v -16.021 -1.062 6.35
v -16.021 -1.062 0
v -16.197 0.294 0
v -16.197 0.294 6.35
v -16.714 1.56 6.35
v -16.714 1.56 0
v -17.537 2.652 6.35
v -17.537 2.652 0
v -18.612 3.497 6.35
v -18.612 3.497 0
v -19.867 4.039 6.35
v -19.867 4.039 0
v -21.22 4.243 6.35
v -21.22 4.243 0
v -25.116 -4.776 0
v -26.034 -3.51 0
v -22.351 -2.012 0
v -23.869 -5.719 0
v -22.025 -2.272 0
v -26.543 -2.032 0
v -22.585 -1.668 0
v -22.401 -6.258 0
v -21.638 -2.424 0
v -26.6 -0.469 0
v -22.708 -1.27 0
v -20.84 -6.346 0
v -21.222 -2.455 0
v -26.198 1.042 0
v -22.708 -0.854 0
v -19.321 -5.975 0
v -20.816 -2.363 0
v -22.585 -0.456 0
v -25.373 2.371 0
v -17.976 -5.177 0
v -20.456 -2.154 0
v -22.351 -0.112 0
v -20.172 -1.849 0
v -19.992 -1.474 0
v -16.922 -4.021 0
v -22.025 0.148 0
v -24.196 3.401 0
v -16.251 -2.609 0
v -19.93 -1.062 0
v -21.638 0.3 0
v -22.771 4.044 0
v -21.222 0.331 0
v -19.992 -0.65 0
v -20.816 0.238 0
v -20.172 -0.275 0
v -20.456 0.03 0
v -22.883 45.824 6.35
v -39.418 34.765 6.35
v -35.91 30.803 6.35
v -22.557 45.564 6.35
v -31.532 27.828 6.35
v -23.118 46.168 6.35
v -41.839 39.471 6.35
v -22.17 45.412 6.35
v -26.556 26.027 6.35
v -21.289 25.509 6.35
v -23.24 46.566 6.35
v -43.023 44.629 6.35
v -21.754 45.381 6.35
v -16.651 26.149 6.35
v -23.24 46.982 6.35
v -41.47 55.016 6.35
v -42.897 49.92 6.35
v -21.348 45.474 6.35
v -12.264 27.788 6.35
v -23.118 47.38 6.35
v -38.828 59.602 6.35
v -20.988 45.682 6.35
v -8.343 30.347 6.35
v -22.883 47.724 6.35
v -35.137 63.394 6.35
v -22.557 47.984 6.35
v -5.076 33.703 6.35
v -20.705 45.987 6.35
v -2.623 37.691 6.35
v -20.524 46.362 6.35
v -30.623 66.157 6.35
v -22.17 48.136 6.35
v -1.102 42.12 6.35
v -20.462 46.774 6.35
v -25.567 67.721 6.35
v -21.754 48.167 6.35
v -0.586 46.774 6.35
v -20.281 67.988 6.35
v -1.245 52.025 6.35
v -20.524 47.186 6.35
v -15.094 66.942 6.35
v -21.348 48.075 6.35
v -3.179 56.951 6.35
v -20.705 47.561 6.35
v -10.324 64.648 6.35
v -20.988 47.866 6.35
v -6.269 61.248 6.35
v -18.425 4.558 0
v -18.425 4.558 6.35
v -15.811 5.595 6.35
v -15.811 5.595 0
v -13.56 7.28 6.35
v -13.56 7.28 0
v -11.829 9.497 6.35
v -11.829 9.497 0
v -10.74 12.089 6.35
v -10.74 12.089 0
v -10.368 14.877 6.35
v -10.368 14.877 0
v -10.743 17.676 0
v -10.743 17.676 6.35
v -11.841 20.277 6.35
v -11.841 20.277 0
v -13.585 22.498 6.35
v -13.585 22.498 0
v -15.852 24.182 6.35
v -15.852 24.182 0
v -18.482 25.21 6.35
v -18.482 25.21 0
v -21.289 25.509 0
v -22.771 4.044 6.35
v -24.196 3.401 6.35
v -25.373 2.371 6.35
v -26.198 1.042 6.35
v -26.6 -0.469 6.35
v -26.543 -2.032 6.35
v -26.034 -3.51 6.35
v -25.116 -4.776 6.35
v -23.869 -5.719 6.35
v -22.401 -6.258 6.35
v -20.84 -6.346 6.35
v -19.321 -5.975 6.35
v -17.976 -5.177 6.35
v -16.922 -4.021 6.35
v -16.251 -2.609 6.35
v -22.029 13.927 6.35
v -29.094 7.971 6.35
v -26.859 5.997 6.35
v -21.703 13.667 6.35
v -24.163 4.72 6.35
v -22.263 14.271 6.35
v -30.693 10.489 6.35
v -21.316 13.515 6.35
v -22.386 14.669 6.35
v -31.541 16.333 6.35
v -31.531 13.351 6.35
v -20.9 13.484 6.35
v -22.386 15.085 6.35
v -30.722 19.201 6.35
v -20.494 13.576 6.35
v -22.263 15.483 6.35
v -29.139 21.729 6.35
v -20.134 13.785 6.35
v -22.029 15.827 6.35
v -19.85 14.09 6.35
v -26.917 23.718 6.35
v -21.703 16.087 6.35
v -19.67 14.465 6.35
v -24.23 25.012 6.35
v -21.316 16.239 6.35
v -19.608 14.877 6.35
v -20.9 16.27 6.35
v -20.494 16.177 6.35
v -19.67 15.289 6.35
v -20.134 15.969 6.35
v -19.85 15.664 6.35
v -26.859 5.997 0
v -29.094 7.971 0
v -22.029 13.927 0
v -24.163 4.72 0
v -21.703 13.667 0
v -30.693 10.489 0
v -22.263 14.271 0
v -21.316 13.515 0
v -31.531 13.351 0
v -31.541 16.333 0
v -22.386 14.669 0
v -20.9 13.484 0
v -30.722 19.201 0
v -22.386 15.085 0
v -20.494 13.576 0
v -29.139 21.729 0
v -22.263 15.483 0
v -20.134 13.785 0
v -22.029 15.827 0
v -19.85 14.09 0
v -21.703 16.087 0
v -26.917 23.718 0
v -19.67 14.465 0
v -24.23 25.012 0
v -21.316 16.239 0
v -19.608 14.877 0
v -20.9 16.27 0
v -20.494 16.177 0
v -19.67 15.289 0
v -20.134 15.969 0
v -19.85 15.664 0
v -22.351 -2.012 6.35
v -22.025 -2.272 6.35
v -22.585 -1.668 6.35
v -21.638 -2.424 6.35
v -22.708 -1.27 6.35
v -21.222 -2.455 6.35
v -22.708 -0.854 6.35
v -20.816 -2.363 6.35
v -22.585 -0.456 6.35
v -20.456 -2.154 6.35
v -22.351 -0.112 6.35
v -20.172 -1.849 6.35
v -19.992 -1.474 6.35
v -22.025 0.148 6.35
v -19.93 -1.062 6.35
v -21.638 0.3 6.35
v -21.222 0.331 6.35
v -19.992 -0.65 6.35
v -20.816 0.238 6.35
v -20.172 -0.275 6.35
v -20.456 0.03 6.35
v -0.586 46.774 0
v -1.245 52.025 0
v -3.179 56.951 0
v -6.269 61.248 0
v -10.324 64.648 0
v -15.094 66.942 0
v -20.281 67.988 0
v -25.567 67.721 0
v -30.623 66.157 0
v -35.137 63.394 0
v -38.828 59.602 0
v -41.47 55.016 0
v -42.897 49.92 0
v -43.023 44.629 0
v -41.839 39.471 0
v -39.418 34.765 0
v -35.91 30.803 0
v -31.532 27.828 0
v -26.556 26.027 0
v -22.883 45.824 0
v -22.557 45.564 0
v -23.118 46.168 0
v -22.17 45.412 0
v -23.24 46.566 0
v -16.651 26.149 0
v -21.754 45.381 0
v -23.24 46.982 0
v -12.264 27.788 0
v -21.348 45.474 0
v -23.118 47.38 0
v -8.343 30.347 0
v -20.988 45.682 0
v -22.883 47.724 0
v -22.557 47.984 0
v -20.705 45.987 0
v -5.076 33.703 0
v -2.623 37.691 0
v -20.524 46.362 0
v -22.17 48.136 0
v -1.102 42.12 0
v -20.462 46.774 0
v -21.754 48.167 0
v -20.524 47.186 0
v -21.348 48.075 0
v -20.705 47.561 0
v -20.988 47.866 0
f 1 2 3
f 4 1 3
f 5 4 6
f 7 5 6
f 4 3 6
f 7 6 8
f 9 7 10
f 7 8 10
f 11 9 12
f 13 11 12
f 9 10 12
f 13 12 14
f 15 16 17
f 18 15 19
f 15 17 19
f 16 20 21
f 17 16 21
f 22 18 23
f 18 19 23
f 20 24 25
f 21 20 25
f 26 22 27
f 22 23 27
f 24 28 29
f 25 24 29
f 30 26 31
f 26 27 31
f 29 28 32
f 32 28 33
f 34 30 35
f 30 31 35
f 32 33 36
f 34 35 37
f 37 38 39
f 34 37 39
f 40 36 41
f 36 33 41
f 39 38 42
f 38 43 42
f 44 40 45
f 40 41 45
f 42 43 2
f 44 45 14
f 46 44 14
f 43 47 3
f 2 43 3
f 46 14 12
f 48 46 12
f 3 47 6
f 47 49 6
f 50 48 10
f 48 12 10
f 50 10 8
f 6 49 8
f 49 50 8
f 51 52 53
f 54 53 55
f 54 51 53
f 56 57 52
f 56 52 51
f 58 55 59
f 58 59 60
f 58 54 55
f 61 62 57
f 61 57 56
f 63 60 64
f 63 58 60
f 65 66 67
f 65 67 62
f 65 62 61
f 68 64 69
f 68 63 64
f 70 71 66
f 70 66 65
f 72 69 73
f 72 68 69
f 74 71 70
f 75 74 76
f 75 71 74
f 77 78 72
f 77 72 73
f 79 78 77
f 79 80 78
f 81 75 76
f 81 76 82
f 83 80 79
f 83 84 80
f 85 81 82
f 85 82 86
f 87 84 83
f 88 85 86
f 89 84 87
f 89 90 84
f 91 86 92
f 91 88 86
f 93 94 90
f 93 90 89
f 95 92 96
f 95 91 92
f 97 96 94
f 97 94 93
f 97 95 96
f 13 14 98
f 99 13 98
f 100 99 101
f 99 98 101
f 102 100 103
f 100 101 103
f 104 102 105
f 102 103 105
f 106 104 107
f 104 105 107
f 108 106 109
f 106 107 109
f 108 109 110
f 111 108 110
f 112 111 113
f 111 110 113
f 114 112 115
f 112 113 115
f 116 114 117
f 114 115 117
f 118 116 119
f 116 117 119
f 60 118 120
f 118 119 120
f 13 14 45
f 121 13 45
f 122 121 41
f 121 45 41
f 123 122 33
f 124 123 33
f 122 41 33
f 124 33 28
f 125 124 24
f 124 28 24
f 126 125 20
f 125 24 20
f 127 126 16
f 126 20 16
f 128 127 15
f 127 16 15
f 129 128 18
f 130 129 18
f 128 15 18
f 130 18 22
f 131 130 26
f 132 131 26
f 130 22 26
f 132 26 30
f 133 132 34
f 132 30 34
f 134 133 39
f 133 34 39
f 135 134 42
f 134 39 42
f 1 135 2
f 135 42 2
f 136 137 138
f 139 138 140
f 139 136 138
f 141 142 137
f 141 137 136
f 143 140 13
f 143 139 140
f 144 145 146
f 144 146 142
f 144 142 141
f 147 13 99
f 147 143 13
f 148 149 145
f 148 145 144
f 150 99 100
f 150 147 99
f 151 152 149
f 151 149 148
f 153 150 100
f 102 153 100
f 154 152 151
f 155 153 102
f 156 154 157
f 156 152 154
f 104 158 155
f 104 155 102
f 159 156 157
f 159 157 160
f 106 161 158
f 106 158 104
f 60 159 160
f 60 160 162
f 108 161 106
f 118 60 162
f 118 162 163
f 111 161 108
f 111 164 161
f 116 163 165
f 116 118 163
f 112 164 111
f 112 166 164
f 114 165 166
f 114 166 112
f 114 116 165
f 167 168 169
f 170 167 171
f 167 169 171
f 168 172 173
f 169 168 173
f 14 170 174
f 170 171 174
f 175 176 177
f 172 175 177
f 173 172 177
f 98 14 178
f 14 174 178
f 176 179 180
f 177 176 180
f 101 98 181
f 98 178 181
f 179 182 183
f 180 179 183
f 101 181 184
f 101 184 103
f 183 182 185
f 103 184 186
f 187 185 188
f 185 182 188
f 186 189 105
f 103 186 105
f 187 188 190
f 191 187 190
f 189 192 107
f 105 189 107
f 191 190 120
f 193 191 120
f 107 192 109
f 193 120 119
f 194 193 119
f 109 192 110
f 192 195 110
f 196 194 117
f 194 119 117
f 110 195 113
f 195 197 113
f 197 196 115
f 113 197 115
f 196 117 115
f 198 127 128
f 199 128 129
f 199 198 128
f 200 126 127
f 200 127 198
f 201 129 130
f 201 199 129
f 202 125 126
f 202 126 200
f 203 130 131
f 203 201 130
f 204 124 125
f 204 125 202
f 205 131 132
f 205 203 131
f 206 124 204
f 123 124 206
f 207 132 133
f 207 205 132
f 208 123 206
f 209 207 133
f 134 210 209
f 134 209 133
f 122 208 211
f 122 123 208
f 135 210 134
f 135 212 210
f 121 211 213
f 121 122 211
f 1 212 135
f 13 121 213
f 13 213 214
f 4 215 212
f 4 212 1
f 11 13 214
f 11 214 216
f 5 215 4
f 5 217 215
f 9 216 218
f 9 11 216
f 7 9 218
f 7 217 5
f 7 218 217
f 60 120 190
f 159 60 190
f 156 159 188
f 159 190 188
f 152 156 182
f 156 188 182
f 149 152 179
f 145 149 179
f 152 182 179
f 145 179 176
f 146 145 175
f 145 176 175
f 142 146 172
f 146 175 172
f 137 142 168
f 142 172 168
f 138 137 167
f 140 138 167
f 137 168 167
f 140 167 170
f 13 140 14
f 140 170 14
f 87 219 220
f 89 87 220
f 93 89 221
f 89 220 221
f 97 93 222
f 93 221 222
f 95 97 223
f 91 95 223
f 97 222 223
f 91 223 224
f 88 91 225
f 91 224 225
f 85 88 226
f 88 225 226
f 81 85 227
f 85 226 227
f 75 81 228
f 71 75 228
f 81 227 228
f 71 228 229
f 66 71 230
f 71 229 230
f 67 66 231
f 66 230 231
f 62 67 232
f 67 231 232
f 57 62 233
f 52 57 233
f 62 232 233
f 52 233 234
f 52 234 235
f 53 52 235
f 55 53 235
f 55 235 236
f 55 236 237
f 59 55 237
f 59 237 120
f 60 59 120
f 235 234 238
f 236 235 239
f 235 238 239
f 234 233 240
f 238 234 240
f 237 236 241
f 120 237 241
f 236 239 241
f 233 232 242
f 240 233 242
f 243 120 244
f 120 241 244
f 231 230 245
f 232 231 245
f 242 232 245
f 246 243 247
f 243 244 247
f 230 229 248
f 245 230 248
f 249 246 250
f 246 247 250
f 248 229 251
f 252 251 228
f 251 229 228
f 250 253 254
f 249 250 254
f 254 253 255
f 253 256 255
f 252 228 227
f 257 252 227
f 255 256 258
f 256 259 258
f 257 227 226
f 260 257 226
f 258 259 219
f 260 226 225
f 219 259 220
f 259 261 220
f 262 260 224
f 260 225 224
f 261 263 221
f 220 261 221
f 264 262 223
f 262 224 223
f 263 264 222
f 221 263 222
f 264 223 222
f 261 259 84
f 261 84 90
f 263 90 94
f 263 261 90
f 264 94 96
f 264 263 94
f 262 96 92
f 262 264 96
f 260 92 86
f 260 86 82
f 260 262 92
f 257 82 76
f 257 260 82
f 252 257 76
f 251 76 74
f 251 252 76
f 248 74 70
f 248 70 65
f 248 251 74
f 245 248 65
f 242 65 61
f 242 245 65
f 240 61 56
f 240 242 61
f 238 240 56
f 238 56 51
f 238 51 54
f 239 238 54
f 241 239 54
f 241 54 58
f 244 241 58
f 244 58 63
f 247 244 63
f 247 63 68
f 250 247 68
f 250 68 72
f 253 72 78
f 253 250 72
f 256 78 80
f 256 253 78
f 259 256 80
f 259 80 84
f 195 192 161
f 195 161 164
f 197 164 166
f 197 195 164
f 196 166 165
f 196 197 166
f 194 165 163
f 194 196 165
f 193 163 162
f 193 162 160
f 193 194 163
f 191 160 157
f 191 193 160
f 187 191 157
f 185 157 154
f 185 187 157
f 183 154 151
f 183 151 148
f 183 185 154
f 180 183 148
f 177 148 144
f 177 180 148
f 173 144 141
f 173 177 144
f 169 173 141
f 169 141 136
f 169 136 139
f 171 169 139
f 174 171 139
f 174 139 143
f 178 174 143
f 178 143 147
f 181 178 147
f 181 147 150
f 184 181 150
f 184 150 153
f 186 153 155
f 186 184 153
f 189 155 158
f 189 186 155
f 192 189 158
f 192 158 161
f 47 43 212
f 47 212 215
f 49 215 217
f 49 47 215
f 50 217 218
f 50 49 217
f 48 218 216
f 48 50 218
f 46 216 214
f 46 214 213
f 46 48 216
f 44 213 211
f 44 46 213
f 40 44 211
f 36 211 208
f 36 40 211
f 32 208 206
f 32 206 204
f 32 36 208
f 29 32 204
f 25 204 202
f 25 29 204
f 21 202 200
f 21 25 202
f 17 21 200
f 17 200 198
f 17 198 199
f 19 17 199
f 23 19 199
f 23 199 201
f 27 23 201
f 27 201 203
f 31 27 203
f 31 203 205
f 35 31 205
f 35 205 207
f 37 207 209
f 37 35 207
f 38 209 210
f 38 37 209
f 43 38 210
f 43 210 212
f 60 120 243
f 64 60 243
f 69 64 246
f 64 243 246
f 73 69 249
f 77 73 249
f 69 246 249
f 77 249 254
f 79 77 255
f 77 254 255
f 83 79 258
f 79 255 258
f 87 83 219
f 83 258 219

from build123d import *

# Parameters (mm, degrees)
F0_R     = 1.397
F5_DEPTH = 6.35
F6_DEPTH = 6.35
F7_DEPTH = 6.35


# Not quite as in the source:
# - the program builds the solid bodies; features that only make, move or delete a surface that nothing else refers to are left out


with BuildPart() as f5:
    # F0 (on Top) → F5 (new body)
    with BuildSketch(Plane.XY):
        with BuildLine():
            ThreePointArc((-21.2893928371, 25.5092685574), (-6.6169283749, 31.9349210812), (-0.5863672337, 46.7741446483))
            ThreePointArc((-0.5863672337, 46.7741446483), (-37.1008060925, 61.6133682154), (-21.2893928371, 25.5092685574))
        make_face()
        with Locations((-21.8588672337, 46.7741446483)):
            Circle(F0_R, mode=Mode.SUBTRACT)
    extrude(amount=F5_DEPTH)

    # F0 (on Top) → F6 (join)
    with BuildSketch(Plane.XY):
        with BuildLine():
            ThreePointArc((-10.3684056873, 14.8768305106), (-13.5850438864, 22.4977999231), (-21.2893928371, 25.5092685574))
            ThreePointArc((-21.2893928371, 25.5092685574), (-31.640848297, 14.8418900995), (-21.219531291, 4.2427512116))
            ThreePointArc((-21.219531291, 4.2427512116), (-13.5600487997, 7.2802758737), (-10.3684056873, 14.8768305106))
        make_face()
        with Locations((-21.0046556873, 14.8768305106)):
            Circle(F0_R, mode=Mode.SUBTRACT)
    extrude(amount=F6_DEPTH)

    # F0 (on Top) → F7 (join)
    with BuildSketch(Plane.XY):
        with BuildLine():
            ThreePointArc((-16.0206653431, -1.0622259004), (-17.5370650156, 2.6516329184), (-21.219531291, 4.2427512116))
            ThreePointArc((-21.219531291, 4.2427512116), (-25.1163856705, -4.7760847192), (-16.0206653431, -1.0622259004))
        make_face()
        with Locations((-21.3267253431, -1.0622259004)):
            Circle(F0_R, mode=Mode.SUBTRACT)
    extrude(amount=F7_DEPTH)


solid = f5.part
